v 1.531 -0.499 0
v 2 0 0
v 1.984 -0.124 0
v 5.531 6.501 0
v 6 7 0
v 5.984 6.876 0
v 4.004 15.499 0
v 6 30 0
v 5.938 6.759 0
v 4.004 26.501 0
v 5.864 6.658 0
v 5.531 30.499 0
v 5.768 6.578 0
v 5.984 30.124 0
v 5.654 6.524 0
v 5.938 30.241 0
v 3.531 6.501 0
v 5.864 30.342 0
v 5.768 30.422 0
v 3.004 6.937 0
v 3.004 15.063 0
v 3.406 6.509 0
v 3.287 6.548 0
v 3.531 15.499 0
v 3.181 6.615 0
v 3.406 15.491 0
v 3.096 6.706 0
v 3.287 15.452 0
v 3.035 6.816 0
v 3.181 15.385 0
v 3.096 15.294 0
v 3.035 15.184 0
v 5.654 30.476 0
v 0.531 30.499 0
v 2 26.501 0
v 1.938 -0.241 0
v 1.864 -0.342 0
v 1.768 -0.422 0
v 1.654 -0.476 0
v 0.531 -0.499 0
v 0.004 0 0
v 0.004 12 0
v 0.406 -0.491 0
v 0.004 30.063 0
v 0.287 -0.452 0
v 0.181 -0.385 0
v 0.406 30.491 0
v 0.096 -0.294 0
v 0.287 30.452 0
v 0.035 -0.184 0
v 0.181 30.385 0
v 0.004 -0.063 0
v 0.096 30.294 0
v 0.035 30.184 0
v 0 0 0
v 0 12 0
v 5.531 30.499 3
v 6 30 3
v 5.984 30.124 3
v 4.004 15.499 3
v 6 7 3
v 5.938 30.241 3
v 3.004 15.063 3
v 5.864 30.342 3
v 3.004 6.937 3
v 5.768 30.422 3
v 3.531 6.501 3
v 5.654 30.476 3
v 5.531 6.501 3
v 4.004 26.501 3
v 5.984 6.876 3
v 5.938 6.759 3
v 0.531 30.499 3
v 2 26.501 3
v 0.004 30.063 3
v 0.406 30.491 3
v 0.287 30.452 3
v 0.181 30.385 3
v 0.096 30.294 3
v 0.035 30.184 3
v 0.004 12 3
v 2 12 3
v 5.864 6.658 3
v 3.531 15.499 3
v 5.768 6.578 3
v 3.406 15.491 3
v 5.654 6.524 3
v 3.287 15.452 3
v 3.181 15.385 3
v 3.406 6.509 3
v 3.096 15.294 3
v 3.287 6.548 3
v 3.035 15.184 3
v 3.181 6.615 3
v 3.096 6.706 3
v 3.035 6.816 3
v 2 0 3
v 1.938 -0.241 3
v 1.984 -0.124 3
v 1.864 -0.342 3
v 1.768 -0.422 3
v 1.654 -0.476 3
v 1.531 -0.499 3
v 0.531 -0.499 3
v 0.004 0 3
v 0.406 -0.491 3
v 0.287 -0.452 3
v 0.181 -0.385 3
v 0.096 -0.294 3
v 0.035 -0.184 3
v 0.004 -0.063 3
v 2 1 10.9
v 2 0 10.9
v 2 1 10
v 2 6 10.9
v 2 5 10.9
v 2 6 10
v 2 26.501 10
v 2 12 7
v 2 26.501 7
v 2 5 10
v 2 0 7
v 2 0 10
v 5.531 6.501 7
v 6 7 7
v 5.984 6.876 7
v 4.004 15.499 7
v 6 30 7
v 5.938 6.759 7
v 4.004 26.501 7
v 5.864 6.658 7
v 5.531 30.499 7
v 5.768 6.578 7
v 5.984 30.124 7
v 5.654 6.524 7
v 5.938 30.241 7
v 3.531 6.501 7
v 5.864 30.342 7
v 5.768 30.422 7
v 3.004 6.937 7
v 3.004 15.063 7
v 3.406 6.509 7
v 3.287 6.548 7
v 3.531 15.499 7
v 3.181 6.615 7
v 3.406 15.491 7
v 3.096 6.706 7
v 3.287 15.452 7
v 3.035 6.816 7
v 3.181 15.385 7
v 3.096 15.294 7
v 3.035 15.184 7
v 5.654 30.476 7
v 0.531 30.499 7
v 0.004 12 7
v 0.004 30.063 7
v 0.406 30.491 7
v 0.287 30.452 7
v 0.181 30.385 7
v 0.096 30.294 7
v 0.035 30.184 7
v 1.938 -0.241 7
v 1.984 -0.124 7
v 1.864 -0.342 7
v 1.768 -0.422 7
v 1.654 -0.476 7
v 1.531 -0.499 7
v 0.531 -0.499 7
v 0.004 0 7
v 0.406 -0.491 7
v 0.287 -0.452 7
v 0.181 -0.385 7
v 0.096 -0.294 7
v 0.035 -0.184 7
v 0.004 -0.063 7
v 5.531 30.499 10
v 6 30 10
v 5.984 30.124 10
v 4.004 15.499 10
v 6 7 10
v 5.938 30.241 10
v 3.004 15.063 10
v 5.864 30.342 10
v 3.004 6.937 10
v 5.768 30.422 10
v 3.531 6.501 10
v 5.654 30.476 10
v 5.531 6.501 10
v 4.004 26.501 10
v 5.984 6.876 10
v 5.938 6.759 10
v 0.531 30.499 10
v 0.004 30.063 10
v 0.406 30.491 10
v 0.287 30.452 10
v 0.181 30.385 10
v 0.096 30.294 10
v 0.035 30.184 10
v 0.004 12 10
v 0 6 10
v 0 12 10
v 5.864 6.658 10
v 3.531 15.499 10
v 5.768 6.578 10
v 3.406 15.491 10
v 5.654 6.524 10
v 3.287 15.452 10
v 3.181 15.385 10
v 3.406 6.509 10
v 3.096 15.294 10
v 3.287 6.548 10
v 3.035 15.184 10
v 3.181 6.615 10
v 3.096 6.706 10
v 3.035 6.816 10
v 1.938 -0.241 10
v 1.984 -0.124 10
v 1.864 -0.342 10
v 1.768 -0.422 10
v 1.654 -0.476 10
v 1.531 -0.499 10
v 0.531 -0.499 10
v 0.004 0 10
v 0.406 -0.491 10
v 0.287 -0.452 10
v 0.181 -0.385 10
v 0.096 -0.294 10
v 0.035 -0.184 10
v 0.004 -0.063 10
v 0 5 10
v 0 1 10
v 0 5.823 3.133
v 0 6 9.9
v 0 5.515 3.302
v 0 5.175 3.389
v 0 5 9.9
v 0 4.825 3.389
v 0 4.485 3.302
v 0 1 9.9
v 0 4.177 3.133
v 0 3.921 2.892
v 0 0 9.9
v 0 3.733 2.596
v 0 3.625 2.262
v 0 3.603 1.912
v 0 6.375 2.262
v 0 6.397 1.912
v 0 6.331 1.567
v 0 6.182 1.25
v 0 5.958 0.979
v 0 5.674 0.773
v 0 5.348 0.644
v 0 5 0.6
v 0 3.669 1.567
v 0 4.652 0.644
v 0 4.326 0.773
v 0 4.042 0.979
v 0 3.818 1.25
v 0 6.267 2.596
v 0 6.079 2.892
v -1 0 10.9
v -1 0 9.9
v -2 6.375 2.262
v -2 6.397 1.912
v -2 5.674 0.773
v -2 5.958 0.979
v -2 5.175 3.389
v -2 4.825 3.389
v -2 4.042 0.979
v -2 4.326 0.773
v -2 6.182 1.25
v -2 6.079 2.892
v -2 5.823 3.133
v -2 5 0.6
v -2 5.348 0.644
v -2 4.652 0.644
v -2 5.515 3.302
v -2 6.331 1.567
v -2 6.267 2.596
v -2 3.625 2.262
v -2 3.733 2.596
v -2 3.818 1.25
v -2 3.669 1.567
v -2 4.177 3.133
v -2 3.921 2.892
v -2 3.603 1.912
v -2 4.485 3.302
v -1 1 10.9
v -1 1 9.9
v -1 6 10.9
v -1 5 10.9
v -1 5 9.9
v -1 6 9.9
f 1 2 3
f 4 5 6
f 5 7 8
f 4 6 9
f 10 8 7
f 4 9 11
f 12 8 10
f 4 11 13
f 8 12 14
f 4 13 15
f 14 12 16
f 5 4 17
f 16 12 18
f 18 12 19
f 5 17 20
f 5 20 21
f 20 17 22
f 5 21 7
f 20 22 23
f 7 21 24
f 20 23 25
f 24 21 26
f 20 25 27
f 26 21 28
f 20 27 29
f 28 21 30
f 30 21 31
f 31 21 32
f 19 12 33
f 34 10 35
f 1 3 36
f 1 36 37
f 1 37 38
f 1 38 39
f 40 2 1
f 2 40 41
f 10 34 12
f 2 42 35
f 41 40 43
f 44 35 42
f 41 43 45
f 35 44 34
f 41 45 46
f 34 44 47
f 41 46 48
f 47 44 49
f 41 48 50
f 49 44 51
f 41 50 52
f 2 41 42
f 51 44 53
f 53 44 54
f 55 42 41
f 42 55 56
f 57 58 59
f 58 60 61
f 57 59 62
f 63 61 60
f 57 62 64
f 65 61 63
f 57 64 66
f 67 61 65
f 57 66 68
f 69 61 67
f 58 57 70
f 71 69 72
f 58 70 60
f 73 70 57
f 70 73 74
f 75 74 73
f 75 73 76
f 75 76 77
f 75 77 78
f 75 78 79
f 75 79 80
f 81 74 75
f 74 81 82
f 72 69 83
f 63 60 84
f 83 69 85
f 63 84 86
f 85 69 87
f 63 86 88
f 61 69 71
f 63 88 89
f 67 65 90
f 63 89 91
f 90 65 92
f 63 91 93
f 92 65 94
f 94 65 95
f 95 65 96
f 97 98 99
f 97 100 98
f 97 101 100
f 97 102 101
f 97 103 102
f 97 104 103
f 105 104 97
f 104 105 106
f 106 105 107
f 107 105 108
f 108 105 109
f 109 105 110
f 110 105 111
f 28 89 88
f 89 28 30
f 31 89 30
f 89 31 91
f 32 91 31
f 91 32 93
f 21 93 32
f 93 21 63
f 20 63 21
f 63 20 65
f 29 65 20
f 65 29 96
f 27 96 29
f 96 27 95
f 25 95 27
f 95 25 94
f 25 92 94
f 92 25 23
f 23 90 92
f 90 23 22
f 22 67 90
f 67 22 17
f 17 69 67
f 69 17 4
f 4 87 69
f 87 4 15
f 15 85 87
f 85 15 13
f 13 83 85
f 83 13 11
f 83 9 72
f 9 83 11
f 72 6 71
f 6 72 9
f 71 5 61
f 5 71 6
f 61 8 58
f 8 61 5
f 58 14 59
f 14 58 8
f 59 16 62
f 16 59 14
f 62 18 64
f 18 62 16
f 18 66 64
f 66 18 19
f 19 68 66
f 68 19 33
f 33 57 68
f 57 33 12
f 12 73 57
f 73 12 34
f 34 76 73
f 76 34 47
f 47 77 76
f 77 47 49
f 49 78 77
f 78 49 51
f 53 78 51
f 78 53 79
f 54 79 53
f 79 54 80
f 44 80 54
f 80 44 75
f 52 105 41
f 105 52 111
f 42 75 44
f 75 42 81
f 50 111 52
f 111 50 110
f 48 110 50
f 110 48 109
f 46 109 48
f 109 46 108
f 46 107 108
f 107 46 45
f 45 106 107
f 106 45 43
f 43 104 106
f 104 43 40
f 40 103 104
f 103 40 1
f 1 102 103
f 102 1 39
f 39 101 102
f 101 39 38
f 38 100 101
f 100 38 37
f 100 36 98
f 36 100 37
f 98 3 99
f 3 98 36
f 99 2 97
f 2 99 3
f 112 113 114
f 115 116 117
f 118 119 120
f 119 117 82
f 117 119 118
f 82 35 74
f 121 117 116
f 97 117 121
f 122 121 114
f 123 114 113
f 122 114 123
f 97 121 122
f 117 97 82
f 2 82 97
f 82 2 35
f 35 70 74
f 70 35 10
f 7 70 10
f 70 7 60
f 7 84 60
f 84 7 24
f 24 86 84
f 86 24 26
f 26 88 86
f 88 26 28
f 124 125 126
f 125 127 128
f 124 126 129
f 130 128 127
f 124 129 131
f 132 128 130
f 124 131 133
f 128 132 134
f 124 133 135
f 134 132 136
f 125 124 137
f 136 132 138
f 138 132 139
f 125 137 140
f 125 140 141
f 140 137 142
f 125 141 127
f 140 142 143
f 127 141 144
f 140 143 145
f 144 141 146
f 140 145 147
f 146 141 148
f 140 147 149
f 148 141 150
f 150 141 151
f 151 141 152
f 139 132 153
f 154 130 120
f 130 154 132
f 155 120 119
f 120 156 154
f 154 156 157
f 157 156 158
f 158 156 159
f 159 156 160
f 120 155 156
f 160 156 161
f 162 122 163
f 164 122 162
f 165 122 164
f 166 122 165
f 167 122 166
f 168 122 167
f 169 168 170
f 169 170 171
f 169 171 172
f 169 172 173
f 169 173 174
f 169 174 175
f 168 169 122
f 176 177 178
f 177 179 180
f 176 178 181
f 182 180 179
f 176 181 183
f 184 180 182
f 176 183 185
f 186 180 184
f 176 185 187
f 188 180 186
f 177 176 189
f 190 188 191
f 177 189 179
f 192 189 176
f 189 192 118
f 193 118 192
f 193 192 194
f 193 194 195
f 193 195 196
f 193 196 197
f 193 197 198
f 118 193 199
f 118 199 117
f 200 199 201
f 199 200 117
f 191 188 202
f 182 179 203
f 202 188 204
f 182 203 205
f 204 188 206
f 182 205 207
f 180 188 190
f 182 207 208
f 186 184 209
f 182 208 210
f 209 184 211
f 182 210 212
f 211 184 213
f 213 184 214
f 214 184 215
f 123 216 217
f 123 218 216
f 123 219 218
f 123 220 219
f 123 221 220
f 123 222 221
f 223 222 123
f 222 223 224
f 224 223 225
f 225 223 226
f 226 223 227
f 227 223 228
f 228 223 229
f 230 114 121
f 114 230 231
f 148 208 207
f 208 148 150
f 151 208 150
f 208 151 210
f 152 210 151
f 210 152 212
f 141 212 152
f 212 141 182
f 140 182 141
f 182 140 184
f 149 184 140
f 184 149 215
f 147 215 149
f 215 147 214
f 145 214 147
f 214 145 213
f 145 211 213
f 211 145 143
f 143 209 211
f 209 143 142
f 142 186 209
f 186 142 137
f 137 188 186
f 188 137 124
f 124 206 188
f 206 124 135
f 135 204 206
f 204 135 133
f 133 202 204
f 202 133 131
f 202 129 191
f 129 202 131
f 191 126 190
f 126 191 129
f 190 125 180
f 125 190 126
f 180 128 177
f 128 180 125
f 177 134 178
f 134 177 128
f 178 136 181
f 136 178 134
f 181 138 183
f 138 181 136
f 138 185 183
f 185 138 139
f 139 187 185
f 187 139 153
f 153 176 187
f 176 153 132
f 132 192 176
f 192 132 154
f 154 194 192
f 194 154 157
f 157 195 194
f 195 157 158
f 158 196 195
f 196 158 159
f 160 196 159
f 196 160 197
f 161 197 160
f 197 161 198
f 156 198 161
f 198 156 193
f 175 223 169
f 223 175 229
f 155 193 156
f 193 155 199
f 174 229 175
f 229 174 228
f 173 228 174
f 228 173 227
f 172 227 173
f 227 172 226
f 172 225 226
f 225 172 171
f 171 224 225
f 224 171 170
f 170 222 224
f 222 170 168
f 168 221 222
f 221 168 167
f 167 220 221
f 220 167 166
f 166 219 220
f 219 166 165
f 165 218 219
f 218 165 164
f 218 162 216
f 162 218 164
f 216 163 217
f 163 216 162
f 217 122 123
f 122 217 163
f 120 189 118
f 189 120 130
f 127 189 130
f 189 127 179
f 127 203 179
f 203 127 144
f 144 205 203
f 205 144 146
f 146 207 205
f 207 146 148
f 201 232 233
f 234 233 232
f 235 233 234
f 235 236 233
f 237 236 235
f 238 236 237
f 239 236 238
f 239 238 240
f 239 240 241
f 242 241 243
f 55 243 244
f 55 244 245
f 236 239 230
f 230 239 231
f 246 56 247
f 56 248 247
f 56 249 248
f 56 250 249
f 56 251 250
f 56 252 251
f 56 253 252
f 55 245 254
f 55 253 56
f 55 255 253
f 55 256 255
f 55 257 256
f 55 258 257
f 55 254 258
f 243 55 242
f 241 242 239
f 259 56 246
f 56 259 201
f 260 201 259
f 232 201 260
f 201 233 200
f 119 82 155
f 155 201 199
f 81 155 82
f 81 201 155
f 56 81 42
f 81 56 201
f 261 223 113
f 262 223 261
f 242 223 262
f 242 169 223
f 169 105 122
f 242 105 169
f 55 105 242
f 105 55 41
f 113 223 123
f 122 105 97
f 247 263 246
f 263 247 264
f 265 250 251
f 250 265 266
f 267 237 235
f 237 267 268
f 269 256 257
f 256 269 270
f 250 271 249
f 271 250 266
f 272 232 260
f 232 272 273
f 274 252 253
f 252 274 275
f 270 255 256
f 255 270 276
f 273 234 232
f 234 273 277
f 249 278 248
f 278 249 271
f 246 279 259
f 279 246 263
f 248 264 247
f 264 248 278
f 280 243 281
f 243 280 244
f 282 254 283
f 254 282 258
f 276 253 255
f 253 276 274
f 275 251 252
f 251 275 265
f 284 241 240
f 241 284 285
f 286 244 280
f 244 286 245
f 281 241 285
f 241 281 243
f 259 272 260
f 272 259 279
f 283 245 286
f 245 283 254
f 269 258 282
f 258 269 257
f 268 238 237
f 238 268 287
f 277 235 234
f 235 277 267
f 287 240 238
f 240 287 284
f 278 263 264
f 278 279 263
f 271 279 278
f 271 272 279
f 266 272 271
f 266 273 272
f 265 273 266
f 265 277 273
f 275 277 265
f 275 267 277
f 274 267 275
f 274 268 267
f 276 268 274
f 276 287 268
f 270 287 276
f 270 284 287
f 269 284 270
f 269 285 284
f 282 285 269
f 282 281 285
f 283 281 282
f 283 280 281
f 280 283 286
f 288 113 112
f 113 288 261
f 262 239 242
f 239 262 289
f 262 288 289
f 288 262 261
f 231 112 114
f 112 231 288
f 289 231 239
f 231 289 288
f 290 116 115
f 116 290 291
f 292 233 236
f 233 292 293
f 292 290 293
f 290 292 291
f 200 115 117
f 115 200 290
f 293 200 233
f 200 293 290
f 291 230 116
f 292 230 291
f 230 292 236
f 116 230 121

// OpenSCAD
// JMGK (c) 2021

$fn = 25;

module clip() {
  linear_extrude(height = 3) {
    minkowski() {
      polygon(points = [
        [ 0, 0 ],
        [ 0, 30 ],
        [ 5, 30 ],
        [ 5, 7 ],
        [ 3, 7 ],
        [ 3, 15 ],
        [ 4, 15 ],
        [ 4, 27 ],
        [ 1, 27 ],
        [ 1, 0 ],
      ]);
      circle(0.5);
    }
  }
}

//clips
translate([ 0.5, 0, 0 ]) clip();
translate([ 0.5, 0, 7 ]) clip();

//base
cube([ 2, 12, 10 ]);

//pino
translate([ -2, 5, 2 ]) rotate([ 0, 90, 0 ]) cylinder(4, 1.4, 1.4);

//tabs
translate([ -1, 0, 9.9 ]) cube([ 3, 1, 1 ]);
translate([ -1, 5, 9.9 ]) cube([ 3, 1, 1 ]);
